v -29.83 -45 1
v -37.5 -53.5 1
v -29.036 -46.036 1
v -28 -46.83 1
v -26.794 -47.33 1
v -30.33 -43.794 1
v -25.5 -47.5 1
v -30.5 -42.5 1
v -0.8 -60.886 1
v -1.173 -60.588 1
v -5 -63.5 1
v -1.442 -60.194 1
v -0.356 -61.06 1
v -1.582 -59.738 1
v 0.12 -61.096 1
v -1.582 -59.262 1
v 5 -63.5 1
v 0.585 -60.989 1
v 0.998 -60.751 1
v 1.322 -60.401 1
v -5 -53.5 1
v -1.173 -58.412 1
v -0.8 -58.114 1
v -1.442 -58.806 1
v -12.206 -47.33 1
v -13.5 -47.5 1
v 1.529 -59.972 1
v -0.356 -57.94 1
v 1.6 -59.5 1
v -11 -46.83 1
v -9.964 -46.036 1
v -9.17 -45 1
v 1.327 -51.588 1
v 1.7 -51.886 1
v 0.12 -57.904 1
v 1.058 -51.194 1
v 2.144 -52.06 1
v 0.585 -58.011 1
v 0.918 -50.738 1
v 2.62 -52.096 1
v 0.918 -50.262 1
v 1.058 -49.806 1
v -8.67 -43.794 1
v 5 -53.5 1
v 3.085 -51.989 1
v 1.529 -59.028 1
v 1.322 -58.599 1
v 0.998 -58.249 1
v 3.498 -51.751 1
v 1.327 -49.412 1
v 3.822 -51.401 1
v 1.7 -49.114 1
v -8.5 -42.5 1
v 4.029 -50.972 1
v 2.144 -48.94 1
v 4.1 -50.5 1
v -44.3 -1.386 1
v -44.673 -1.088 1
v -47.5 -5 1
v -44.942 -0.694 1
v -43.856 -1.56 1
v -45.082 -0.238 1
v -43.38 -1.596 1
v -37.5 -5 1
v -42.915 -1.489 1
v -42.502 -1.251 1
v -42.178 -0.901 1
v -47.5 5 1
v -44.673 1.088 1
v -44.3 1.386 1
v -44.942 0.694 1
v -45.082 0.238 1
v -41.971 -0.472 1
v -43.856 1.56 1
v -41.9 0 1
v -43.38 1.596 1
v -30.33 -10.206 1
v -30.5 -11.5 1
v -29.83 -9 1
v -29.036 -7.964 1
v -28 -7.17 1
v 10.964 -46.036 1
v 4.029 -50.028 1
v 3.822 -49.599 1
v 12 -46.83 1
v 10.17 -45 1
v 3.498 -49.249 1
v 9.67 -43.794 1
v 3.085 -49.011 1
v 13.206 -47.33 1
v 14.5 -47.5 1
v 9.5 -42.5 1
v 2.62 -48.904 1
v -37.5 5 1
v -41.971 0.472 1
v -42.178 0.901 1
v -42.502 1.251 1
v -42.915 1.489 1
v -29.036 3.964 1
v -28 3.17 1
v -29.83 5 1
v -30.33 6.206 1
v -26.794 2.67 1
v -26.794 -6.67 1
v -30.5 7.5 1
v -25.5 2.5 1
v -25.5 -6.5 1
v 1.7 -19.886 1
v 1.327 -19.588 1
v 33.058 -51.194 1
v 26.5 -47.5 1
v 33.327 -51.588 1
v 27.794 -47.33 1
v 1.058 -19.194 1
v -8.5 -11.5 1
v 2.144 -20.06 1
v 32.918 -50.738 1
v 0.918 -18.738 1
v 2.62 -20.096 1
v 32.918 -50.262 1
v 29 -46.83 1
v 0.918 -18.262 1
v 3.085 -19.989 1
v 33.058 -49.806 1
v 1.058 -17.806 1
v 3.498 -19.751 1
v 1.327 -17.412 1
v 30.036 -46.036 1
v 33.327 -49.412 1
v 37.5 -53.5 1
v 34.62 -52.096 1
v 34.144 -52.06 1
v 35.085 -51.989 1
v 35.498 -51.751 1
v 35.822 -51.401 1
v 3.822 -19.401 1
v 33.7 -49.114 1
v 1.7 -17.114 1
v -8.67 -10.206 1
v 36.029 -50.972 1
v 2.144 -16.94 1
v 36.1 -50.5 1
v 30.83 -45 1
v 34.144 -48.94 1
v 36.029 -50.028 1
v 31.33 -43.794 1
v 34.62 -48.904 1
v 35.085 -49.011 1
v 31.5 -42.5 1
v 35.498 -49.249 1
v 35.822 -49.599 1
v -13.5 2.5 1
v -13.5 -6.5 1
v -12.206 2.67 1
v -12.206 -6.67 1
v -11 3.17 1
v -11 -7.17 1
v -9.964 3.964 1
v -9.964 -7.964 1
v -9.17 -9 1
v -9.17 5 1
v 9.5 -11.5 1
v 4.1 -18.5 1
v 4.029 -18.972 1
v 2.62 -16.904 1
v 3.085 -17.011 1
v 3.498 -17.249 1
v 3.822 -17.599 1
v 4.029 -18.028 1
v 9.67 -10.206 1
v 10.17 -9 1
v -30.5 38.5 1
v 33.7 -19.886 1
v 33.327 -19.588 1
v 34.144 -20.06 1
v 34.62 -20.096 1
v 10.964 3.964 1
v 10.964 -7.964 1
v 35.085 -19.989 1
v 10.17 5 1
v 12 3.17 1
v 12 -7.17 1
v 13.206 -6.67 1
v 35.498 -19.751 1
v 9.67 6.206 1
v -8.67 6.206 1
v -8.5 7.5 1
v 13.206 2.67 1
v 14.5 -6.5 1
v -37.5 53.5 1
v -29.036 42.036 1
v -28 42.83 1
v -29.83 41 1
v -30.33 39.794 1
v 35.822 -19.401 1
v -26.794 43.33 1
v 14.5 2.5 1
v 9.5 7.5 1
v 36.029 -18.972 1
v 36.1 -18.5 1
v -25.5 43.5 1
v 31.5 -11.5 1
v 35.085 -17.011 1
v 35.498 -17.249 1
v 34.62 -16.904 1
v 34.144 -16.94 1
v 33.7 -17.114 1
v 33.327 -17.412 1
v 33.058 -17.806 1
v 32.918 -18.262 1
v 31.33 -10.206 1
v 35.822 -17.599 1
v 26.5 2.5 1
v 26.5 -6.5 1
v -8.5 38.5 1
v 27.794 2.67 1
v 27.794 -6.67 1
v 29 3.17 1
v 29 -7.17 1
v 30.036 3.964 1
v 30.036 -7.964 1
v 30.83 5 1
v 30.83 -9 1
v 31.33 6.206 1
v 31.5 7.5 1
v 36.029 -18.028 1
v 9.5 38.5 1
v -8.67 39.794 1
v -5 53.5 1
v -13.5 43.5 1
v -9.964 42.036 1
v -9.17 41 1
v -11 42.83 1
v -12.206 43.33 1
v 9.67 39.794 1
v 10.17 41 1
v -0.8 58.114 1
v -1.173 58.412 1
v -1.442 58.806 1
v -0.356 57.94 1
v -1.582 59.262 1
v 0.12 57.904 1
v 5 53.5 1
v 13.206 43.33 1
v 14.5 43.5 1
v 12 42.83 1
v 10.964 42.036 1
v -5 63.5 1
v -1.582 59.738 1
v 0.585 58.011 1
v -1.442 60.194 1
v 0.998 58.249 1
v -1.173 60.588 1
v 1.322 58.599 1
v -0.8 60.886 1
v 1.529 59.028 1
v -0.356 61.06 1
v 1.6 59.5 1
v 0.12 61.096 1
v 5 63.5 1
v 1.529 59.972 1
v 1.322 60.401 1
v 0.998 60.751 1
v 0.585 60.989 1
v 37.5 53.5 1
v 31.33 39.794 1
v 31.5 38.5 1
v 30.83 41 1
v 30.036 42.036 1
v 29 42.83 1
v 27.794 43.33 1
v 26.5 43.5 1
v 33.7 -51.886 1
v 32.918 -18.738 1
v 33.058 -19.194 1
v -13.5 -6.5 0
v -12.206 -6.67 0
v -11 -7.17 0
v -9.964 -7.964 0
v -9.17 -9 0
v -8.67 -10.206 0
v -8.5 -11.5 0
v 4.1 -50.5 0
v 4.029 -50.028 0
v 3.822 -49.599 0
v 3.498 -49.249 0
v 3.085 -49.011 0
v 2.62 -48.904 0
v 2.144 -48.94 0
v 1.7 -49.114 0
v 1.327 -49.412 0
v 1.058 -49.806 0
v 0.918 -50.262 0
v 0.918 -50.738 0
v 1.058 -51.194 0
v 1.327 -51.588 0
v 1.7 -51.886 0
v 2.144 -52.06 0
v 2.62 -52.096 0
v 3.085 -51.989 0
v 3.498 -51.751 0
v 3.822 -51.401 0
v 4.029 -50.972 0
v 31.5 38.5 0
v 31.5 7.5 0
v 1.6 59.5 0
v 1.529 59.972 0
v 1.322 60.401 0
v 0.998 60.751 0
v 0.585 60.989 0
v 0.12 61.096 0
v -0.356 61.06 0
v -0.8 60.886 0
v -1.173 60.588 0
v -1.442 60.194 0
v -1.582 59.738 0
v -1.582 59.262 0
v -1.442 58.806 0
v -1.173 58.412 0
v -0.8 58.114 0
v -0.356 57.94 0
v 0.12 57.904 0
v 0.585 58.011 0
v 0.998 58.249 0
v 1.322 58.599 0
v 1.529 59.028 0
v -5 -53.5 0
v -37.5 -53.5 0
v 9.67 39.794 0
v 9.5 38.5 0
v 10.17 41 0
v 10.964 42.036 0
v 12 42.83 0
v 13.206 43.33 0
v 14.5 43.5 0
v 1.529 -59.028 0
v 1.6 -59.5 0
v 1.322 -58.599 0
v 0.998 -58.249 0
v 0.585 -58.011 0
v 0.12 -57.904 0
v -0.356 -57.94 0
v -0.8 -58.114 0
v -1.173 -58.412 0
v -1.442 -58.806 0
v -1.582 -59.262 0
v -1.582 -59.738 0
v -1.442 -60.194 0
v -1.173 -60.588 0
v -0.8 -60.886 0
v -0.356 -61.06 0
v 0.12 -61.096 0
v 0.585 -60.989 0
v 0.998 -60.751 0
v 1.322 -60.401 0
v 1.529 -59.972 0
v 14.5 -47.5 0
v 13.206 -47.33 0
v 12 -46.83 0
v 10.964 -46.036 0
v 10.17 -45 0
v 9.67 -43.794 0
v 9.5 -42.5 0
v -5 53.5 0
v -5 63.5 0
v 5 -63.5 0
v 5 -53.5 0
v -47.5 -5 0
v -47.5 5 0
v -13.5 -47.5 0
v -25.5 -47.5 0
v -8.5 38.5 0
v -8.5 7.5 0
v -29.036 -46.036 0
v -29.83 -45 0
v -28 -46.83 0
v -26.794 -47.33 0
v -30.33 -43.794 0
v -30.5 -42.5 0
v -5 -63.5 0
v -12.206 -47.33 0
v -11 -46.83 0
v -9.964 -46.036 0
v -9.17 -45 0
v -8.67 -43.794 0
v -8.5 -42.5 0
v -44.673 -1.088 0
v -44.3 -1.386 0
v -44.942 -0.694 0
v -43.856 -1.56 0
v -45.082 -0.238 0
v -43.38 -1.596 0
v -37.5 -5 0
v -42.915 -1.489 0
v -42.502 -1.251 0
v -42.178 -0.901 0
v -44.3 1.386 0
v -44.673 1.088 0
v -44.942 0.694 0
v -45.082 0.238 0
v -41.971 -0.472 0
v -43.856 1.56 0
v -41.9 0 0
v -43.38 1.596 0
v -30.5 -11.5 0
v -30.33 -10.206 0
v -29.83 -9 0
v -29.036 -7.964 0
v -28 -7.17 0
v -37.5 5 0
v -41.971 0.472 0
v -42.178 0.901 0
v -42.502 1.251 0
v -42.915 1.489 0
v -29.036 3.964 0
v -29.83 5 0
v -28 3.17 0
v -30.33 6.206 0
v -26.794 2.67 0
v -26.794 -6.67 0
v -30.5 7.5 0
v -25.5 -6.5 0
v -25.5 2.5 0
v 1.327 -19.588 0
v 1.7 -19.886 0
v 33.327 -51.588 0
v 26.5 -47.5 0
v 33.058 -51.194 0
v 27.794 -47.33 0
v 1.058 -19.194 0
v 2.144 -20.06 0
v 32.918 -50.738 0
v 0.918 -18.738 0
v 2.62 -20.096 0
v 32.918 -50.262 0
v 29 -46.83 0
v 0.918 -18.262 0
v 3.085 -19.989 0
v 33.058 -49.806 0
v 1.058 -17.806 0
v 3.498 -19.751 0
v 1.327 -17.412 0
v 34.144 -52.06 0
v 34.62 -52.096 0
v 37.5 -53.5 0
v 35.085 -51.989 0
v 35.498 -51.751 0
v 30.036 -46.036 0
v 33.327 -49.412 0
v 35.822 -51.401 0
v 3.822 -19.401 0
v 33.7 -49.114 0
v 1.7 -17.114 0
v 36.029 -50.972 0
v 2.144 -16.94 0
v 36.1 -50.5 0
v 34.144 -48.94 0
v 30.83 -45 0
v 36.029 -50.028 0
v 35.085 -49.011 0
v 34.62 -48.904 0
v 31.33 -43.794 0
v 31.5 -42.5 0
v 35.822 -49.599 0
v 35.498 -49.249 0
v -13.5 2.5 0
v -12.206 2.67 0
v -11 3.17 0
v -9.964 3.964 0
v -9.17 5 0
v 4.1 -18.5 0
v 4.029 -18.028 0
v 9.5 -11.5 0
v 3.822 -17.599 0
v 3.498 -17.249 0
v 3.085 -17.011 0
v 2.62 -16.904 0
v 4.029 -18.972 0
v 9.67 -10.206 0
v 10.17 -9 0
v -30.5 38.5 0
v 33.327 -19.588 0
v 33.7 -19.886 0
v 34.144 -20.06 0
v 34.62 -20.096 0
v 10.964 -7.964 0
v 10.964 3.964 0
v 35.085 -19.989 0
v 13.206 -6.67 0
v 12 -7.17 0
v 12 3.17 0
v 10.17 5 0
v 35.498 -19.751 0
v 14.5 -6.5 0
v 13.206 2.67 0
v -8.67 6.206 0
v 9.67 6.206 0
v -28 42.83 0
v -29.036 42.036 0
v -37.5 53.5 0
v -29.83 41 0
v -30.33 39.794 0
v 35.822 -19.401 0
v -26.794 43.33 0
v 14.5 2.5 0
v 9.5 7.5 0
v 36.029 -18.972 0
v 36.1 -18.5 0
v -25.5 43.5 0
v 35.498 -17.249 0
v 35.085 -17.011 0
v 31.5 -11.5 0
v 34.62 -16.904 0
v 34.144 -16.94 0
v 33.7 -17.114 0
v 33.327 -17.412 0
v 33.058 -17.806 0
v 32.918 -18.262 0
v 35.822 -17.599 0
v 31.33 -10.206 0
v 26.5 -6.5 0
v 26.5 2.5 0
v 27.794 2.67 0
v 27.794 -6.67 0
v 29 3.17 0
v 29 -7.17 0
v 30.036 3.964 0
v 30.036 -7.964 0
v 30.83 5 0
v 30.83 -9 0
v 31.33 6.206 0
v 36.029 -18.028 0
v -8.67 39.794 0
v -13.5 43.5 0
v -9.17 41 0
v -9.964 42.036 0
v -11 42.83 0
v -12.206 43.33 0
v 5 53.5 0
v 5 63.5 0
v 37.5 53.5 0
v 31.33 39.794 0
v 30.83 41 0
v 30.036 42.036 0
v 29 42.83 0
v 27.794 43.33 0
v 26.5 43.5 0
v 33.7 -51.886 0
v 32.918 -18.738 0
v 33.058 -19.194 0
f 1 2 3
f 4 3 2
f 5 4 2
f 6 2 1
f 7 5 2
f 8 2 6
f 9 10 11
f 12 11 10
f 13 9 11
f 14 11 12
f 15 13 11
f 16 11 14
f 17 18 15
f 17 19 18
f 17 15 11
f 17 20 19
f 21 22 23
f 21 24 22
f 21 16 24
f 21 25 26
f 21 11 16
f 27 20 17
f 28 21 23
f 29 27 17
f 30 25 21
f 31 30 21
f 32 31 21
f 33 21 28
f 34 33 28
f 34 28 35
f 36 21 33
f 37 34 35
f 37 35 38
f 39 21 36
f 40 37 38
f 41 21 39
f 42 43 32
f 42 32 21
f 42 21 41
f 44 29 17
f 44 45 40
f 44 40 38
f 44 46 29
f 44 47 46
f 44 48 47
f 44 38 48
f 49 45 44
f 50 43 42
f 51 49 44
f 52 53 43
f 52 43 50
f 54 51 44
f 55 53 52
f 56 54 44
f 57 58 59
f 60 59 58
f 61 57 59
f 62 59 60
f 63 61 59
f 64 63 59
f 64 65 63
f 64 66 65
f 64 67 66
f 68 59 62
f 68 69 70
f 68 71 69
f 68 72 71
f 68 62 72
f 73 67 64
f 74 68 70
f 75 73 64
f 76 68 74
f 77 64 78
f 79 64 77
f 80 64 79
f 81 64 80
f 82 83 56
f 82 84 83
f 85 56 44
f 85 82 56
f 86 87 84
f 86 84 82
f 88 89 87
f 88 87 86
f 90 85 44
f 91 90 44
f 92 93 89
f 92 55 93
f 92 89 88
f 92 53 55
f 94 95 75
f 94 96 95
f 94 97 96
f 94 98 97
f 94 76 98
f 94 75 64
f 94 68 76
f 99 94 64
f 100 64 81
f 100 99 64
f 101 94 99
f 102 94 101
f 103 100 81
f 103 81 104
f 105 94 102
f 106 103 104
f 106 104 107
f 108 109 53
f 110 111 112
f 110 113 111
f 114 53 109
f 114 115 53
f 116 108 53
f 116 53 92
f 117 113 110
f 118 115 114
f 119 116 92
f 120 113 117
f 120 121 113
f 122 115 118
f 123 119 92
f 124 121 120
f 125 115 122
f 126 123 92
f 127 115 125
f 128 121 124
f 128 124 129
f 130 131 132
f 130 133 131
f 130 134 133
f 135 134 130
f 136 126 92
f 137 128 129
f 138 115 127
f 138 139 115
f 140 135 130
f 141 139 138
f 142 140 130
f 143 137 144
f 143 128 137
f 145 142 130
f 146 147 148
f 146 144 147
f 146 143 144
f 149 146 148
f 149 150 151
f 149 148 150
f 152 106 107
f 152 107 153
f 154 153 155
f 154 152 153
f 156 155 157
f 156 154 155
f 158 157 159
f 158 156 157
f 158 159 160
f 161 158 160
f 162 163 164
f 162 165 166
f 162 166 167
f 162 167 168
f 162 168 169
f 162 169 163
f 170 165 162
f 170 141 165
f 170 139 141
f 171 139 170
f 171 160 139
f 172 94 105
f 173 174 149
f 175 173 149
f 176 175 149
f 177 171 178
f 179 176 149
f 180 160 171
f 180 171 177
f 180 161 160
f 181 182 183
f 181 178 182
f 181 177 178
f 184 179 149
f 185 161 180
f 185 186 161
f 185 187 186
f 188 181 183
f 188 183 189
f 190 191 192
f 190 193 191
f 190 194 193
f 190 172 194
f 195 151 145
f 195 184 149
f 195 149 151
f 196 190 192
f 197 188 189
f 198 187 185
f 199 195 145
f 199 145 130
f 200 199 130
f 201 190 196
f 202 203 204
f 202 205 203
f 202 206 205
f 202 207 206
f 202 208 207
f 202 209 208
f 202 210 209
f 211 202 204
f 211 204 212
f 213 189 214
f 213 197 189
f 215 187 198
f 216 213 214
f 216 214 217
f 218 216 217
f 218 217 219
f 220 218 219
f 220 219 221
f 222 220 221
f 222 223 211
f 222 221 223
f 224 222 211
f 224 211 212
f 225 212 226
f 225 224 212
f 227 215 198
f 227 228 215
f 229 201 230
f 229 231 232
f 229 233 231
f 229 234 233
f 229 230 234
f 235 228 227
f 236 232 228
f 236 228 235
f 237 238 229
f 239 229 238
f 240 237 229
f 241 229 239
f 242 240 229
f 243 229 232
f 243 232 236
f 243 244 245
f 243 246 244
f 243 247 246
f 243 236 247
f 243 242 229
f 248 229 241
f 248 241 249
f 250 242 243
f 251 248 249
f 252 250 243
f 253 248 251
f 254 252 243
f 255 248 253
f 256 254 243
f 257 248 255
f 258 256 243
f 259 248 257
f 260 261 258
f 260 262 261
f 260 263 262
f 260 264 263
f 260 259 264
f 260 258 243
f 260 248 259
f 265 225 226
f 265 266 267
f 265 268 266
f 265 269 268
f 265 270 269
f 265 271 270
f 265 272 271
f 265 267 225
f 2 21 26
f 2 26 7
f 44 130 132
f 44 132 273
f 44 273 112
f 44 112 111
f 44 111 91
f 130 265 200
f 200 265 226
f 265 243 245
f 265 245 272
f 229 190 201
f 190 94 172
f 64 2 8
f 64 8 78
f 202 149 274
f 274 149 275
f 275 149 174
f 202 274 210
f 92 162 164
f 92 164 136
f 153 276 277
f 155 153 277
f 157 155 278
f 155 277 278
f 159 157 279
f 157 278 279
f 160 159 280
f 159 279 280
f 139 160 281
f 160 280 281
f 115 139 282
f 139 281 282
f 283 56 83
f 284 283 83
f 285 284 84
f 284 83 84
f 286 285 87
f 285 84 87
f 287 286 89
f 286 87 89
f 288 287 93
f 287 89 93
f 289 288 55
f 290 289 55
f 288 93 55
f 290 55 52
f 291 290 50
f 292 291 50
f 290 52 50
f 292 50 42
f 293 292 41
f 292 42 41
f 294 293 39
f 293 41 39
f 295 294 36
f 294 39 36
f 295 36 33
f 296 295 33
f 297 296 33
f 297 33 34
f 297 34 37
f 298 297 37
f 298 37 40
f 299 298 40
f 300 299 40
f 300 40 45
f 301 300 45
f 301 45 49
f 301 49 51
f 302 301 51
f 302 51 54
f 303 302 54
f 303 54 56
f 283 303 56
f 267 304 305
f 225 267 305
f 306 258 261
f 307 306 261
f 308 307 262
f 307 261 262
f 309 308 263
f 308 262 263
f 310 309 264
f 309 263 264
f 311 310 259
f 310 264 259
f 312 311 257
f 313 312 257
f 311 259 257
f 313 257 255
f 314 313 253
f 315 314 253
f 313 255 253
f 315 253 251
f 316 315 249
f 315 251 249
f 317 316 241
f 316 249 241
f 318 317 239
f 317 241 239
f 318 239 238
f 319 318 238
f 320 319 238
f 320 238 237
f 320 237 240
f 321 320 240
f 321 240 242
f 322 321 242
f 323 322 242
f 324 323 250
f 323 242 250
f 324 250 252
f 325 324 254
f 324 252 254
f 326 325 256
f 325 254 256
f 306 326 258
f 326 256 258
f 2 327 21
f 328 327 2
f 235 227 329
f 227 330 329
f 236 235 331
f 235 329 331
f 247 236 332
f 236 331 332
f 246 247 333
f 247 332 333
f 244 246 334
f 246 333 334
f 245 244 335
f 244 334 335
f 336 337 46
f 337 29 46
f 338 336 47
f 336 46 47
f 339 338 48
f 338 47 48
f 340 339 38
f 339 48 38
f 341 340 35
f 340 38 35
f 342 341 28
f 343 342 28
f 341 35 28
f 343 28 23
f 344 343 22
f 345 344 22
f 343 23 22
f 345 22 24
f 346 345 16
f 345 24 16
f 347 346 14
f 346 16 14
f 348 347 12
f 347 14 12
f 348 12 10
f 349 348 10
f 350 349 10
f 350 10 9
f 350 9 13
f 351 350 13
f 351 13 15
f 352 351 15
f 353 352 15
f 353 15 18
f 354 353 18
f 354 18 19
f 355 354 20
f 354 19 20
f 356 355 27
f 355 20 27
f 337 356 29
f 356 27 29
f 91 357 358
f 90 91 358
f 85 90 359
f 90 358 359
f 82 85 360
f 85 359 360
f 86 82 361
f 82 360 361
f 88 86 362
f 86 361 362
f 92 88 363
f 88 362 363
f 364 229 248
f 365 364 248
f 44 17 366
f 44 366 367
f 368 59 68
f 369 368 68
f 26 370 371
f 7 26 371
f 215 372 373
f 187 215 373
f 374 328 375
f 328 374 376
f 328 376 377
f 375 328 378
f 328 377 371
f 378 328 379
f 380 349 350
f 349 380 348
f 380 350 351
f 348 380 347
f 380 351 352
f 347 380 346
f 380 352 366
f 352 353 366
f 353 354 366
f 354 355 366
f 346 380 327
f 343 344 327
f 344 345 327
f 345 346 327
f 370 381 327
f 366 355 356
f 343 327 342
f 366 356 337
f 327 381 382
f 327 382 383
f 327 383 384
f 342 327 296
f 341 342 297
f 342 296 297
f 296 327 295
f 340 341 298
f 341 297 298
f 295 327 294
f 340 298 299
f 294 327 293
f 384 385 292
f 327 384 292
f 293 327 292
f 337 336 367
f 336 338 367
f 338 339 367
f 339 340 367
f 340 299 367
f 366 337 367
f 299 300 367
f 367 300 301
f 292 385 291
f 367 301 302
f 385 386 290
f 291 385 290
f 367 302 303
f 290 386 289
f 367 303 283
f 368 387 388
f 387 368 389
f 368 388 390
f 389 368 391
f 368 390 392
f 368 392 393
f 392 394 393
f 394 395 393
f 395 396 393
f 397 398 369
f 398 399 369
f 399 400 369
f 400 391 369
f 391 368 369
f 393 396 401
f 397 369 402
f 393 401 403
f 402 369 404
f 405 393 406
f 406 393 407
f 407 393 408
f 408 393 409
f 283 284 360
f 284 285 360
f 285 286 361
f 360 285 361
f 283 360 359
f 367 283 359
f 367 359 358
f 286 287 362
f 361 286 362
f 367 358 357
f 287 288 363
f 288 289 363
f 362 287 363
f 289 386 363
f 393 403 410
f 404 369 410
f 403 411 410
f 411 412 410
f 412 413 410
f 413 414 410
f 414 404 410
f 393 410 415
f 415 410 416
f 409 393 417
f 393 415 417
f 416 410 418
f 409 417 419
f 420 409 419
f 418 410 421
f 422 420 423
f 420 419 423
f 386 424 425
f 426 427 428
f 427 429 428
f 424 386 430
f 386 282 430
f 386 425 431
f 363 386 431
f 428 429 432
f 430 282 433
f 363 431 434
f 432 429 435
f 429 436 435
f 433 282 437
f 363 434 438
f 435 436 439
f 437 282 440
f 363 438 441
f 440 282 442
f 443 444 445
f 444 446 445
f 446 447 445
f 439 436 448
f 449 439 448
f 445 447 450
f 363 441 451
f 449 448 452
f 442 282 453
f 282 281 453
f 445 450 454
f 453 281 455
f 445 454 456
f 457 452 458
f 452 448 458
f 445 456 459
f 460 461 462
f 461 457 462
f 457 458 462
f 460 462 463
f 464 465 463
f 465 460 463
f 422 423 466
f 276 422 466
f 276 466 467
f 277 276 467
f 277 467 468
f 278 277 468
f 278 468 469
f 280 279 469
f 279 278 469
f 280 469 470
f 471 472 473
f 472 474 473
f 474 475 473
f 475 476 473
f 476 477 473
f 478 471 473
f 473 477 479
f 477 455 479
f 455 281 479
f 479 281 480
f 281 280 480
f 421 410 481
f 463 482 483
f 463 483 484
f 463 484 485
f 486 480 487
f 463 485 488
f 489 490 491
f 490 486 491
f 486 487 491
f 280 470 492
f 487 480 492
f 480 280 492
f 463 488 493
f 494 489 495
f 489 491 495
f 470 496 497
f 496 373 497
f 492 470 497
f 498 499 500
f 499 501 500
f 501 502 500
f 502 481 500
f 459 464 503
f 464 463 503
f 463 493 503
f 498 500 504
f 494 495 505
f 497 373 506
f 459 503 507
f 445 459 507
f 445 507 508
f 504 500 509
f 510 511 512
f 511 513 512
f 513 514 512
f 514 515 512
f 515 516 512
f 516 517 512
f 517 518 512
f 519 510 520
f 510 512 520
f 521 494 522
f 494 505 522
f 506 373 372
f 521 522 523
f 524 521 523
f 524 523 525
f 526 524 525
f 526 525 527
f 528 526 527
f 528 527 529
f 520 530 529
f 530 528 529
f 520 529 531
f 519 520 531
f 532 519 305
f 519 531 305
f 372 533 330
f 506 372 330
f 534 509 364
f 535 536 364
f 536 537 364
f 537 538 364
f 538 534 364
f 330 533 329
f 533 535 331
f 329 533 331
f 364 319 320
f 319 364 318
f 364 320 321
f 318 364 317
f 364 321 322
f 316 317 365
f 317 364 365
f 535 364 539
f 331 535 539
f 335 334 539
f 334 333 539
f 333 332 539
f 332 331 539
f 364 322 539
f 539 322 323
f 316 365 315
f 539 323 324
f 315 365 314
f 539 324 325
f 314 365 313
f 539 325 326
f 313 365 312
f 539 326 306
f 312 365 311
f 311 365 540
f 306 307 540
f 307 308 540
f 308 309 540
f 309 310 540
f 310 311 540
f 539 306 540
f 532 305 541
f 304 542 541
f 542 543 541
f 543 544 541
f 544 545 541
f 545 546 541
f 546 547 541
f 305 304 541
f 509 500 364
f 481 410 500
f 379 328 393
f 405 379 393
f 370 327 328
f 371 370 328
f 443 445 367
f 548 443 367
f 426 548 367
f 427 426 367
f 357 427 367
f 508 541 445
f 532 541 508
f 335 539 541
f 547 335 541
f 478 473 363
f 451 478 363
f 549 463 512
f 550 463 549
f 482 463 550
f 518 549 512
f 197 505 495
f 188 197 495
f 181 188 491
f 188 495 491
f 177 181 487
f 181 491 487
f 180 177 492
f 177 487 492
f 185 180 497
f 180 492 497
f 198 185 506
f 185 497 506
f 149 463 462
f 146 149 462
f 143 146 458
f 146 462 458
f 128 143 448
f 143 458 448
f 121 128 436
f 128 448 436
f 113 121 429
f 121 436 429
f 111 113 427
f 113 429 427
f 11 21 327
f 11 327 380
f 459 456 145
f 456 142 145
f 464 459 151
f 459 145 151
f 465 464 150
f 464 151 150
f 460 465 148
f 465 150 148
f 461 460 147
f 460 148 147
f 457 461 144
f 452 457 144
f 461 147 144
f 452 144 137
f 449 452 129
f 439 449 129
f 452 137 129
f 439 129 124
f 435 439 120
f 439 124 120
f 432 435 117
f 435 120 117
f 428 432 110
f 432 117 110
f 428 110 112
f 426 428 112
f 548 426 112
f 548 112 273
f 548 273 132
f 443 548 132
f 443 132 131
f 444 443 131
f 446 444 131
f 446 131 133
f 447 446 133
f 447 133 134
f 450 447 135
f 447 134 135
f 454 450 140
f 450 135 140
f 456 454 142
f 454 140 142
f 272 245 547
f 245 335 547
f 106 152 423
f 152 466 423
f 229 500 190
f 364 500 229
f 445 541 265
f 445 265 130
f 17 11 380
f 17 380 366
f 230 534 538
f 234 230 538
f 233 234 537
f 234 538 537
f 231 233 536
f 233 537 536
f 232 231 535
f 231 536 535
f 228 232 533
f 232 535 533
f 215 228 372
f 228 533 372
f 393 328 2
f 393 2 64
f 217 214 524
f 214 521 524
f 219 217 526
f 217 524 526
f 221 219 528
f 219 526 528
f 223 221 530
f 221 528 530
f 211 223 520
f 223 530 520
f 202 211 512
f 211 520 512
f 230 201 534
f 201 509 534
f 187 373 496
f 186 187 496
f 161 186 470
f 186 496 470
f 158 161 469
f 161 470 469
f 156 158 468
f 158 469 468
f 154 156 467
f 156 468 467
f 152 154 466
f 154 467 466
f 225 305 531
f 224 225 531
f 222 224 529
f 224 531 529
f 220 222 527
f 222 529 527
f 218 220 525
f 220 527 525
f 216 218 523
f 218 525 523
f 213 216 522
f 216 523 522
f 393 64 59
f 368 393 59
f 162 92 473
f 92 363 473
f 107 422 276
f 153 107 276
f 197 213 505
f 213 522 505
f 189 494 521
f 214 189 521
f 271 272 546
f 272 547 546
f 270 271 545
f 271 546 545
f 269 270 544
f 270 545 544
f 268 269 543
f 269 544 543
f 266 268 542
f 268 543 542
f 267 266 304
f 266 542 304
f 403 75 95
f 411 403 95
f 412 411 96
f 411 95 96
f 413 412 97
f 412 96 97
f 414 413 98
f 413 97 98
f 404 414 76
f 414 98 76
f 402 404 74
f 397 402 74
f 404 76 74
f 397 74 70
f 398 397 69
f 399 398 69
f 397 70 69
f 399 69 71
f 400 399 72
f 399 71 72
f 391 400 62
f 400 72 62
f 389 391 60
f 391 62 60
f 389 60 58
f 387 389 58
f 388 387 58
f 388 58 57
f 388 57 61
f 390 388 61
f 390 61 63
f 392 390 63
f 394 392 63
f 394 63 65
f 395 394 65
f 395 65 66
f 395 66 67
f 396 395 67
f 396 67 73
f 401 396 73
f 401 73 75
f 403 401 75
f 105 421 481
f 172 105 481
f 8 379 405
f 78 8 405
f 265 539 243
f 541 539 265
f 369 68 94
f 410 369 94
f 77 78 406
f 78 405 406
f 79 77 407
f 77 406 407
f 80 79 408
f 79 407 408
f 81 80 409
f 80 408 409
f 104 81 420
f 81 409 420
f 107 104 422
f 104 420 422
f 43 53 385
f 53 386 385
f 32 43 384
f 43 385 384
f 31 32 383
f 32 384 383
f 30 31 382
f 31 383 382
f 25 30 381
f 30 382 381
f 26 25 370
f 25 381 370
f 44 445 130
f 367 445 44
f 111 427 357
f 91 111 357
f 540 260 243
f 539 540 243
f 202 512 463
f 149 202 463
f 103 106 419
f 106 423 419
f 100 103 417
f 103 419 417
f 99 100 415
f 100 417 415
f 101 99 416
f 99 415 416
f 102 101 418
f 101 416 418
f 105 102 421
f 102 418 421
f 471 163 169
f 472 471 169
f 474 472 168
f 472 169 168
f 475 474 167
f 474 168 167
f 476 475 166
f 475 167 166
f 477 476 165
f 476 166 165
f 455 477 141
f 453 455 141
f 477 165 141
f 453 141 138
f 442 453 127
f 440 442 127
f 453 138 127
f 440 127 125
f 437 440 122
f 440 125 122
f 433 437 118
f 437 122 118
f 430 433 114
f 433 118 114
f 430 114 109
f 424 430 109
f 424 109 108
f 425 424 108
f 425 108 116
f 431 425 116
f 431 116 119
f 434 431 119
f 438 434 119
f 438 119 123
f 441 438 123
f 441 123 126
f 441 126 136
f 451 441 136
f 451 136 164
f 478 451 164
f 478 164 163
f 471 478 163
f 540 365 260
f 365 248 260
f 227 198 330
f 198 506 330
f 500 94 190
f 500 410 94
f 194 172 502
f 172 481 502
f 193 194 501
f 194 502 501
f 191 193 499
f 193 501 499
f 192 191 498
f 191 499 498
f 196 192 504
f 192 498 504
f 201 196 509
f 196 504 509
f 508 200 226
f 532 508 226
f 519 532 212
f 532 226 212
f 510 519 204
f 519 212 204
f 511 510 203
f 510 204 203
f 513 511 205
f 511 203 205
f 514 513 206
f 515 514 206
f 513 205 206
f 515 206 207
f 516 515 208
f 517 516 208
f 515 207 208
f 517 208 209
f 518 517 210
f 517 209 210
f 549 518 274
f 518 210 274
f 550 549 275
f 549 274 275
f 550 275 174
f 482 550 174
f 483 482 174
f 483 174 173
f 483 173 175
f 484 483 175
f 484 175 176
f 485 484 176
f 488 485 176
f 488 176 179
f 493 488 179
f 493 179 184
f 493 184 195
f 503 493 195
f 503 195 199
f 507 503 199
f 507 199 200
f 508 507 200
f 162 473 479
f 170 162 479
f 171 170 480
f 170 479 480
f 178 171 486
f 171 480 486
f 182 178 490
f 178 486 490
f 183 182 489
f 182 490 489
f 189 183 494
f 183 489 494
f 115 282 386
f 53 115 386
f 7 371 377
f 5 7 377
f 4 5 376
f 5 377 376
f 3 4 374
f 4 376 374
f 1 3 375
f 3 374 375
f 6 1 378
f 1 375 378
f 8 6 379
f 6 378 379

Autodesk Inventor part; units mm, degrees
ref_plane "YZ Plane" through (0, 0, 0) normal (1, 0, 0) x (0, 1, 0)
ref_plane "XZ Plane" through (0, 0, 0) normal (0, 1, 0) x (-1, 0, 0)
ref_plane "XY Plane" through (0, 0, 0) normal (0, 0, 1) x (1, 0, 0)
sketch "Sketch1" plane through (0, 0, 0) normal (0, 0, 1) x (1, 0, 0)
  line L0 (-37.5, 53.5) -> (37.5, 53.5)
  line L1 (37.5, 53.5) -> (37.5, -53.5)
  line L2 (37.5, -53.5) -> (-37.5, -53.5)
  line L3 (-37.5, -53.5) -> (-37.5, 53.5)
  line L4 (-37.5, 53.5) -> (37.5, -53.5) construction
  line L5 (37.5, 53.5) -> (-37.5, -53.5) construction
  line L6 (-25.5, 43.5) -> (-13.5, 43.5)
  line L7 (-8.5, 38.5) -> (-8.5, 7.5)
  line L8 (-13.5, 2.5) -> (-25.5, 2.5)
  line L9 (-30.5, 7.5) -> (-30.5, 38.5)
  line L10 (-30.5, 43.5) -> (-8.5, 2.5) construction
  line L11 (-8.5, 43.5) -> (-30.5, 2.5) construction
  arc A0 (-25.5, 43.5) -> (-30.5, 38.5) centre (-25.5, 38.5) ccw
  arc A1 (-8.5, 38.5) -> (-13.5, 43.5) centre (-13.5, 38.5) ccw
  arc A2 (-13.5, 2.5) -> (-8.5, 7.5) centre (-13.5, 7.5) ccw
  arc A3 (-30.5, 7.5) -> (-25.5, 2.5) centre (-25.5, 7.5) ccw
  line L12 (9.5, 7.5) -> (9.5, 38.5)
  arc A4 (26.5, 2.5) -> (31.5, 7.5) centre (26.5, 7.5) ccw
  arc A5 (14.5, 43.5) -> (9.5, 38.5) centre (14.5, 38.5) ccw
  arc A6 (31.5, 38.5) -> (26.5, 43.5) centre (26.5, 38.5) ccw
  arc A7 (9.5, 7.5) -> (14.5, 2.5) centre (14.5, 7.5) ccw
  line L13 (26.5, 2.5) -> (14.5, 2.5)
  line L14 (31.5, 38.5) -> (31.5, 7.5)
  line L15 (9.5, 43.5) -> (31.5, 2.5) construction
  line L16 (14.5, 43.5) -> (26.5, 43.5)
  line L17 (31.5, 43.5) -> (9.5, 2.5) construction
  line L18 (-30.5, -42.5) -> (-30.5, -11.5)
  arc A8 (-13.5, -47.5) -> (-8.5, -42.5) centre (-13.5, -42.5) ccw
  arc A9 (-25.5, -6.5) -> (-30.5, -11.5) centre (-25.5, -11.5) ccw
  arc A10 (-8.5, -11.5) -> (-13.5, -6.5) centre (-13.5, -11.5) ccw
  arc A11 (-30.5, -42.5) -> (-25.5, -47.5) centre (-25.5, -42.5) ccw
  line L19 (-13.5, -47.5) -> (-25.5, -47.5)
  line L20 (-8.5, -11.5) -> (-8.5, -42.5)
  line L21 (-30.5, -6.5) -> (-8.5, -47.5) construction
  line L22 (-25.5, -6.5) -> (-13.5, -6.5)
  line L23 (-8.5, -6.5) -> (-30.5, -47.5) construction
  line L24 (9.5, -42.5) -> (9.5, -11.5)
  arc A12 (26.5, -47.5) -> (31.5, -42.5) centre (26.5, -42.5) ccw
  arc A13 (14.5, -6.5) -> (9.5, -11.5) centre (14.5, -11.5) ccw
  arc A14 (31.5, -11.5) -> (26.5, -6.5) centre (26.5, -11.5) ccw
  arc A15 (9.5, -42.5) -> (14.5, -47.5) centre (14.5, -42.5) ccw
  line L25 (26.5, -47.5) -> (14.5, -47.5)
  line L26 (31.5, -11.5) -> (31.5, -42.5)
  line L27 (9.5, -6.5) -> (31.5, -47.5) construction
  line L28 (14.5, -6.5) -> (26.5, -6.5)
  line L29 (31.5, -6.5) -> (9.5, -47.5) construction
  line L30 (0, 0) -> (0, 8.3009)
  line L31 (0, 0) -> (4.4939, 0)
  point P0 (-19.5, 23)
  point P1 (20.5, 23)
  point P2 (-19.5, -27)
  point P3 (20.5, -27)
  dimension "d0" = 107
  dimension "d1" = 75
  dimension "d3" = 22
  dimension "d4" = 41
  dimension "d5" = 5
  dimension "d8" = 40
  dimension "d11" = 50
  dimension "d14" = 10
  dimension "d15" = 7
extrude "Plate1" add sketch "Sketch1" along normal blind 1
sketch "Sketch2" plane through (0, 0, 1) normal (0, 0, 1) x (1, 0, 0)
  line L0 (37.5, 53.5) -> (37.5, -53.5)
  line L1 (-37.5, -53.5) -> (-37.5, 53.5)
  line L2 (-47.5, 5) -> (-37.5, 5)
  line L3 (-37.5, 5) -> (-37.5, -5)
  line L4 (-37.5, -5) -> (-47.5, -5)
  line L5 (-47.5, -5) -> (-47.5, 5)
  line L6 (-47.5, 5) -> (-37.5, -5) construction
  line L7 (-37.5, 5) -> (-47.5, -5) construction
  line L8 (-37.5, 53.5) -> (37.5, 53.5)
  line L9 (-5, 63.5) -> (5, 63.5)
  line L10 (5, 63.5) -> (5, 53.5)
  line L11 (5, 53.5) -> (-5, 53.5)
  line L12 (-5, 53.5) -> (-5, 63.5)
  line L13 (-5, 63.5) -> (5, 53.5) construction
  line L14 (5, 63.5) -> (-5, 53.5) construction
  line L15 (0, 0) -> (10.0151, 0)
  line L16 (-5, -63.5) -> (5, -63.5)
  line L17 (5, -63.5) -> (5, -53.5)
  line L18 (5, -53.5) -> (-5, -53.5)
  line L19 (-5, -53.5) -> (-5, -63.5)
  line L20 (-5, -63.5) -> (5, -53.5) construction
  line L21 (5, -63.5) -> (-5, -53.5) construction
  circle A0 centre (0, 59.5) radius 1.6
  circle A1 centre (-43.5, 0) radius 1.6
  circle A2 centre (0, -59.5) radius 1.6
  point P0 (-42.5, 0)
  point P1 (0, 58.5)
  point P2 (0, -58.5)
  point P3 (37.5, 38.5)
  dimension "d23" = 10
  dimension "d24" = 10
  dimension "d27" = 10
  dimension "d28" = 10
  dimension "d43" = 3.2
  dimension "d44" = 3.2
  dimension "d45" = 4
  dimension "d46" = 4
sheet face with bend "Face2" sketch "Sketch2" thickness 1 toward (0, 0, -1) bend radius 1
bend "Bend1"
sketch "Sketch3" plane through (0, 0, 1) normal (0, 0, 1) x (1, 0, 0)
  circle A0 centre (2.5, -18.5) radius 1.6
  line L0 (2.5, -18.5) -> (11.3604, -18.5)
  line L1 (2.5, -18.5) -> (2.5, -34.5603)
  circle A1 centre (34.5, -18.5) radius 1.6
  circle A2 centre (2.5, -50.5) radius 1.6
  circle A3 centre (34.5, -50.5) radius 1.6
  line L2 (37.5, 53.5) -> (37.5, -53.5) projected
  line L3 (37.5, -53.5) -> (5, -53.5) projected
  point P0 (0, 0)
  dimension "d48" = 3.2
  dimension "d51" = 32
  dimension "d54" = 32
  dimension "d57" = 35
  dimension "d58" = 35
extrude "Cut1" cut sketch "Sketch3" against normal blind 1
equation "\"d59\" = 厚度"
equation "\"d2\" = 厚度"
equation "\"d37\" = 折彎半徑"
equation "\"d38\" = 折彎離隙寬度"
equation "\"d40\" = 最小剩餘"
equation "\"d39\" = 折彎離隙深度"
equation "\"d41\" = 轉移半徑"
equation "\"折彎半徑\" = 厚度"
equation "\"折彎離隙寬度\" = 厚度"
equation "\"折彎離隙深度\" = 0.5 * 厚度"
equation "\"轉角離隙大小\" = 4 * 厚度"
equation "\"最小剩餘\" = 2 * 厚度"
equation "\"轉移半徑\" = 折彎半徑"
equation "\"Jacobi半徑大小\" = 折彎半徑"
equation "\"間隙大小\" = 厚度"
equation "\"厚度\" = 1"
properties part number "PCB_board_box_right" material "Aluminum"
